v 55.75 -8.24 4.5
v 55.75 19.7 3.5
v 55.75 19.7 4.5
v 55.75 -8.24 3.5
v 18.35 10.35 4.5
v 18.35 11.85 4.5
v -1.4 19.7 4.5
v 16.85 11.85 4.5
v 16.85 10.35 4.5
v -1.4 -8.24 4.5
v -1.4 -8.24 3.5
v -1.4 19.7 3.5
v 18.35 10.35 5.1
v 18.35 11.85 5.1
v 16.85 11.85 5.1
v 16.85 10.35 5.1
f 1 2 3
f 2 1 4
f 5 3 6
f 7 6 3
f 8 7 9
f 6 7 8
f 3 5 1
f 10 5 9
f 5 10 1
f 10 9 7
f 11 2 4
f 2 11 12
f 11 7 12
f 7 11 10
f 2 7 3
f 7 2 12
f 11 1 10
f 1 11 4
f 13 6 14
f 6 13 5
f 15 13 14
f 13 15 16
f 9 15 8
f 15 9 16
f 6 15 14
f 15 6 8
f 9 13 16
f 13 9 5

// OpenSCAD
// file: ../../usb-c-port/usb-c-port.scad
//-----------------------------------------------------------------------
// USB-C port through a wall, flush: the socket's metal shell sits in a
// close-fitting pocket in the wall, walled in on all four sides, its face
// level with the outside. The cable seats the way it does on a laptop.
//
// A board's socket only overhangs the board edge by a mm or so, less than
// the wall. So the board's end tucks into a shallow relief in the wall's
// inner face, the width of the board, leaving the wall round the socket
// thin enough for the face to reach the outside. When that would leave less
// than usbcMinWall (a socket that barely overhangs), the face sits back from
// the outside instead: usbcRecess() says how far.
//
// Modules, all in the same frame:
//   usbcGhost()     the socket and the board's end, for previews
//   usbcWallCut()   subtract from the wall: socket pocket and board relief
//
// Frame: origin on the floor top at the wall's inner face, under the socket's
// axis. +X into the box, Z up. The wall is X = -wall .. 0. The board is
// component side up, socket on top (top-mount, as on the FireBeetle, C3 Super
// Mini and S3 DevKitC). Units: mm.
//
// usbcBoardEdgeX() gives where the board's edge lands (negative: inside the
// wall), so a holder can put its posts or pocket to match.
//-----------------------------------------------------------------------

//-- The socket: USB-C receptacle shell (USB-IF 8.34 x 2.56 plug, receptacle shell ~8.94 x 3.26)
usbcShellW     = 8.94;
usbcShellH     = 3.26;    // CAL per board: measured 3.2 on the FireBeetle
usbcShellR     = 1.2;     // CAL: end radius. Full round would be 1.63; most shells are squarer
usbcShellDepth = 7.35;    // face to back

//-- The pocket
usbcClearance  = 0.15;    // CAL: per side, shell to pocket. Set by the fit piece
usbcMinWall    = 1.0;     // thinnest wall left round the socket
usbcReliefGap  = 0.3;     // board relief over the board, each side and above/below
usbcChamfer    = 0.3;     // lead-in on the outside edge

//-- How far the socket face sits back from the outside: 0 (flush) unless the socket
//-- overhangs the board edge by less than usbcMinWall
function usbcRecess(overhang, minWall = usbcMinWall) = max(0, minWall - overhang);
//-- X of the board's socket edge in this frame
function usbcBoardEdgeX(wall, overhang, recess) =
  -wall + (is_undef(recess) ? usbcRecess(overhang) : recess) + overhang;
//-- Z of the board's underside above the floor top
function usbcBoardZ(axisZ, pcb, shellH = usbcShellH) = axisZ - shellH/2 - pcb;

module usbcShell2D(grow = 0, w = usbcShellW, h = usbcShellH, r = usbcShellR)
{
  offset(r = r + grow, $fn = 24) square([w - 2*r, h - 2*r], center = true);
}

//-- axisZ: socket axis above the floor. boardW/pcb: the board, for the ghost and relief.
//-- shift: socket centre across the board's width from the board's centre line (+Y)
module usbcGhost(axisZ, wall, overhang, boardW, pcb = 1.6, recess, shift = 0, shellH = usbcShellH, shellW = usbcShellW)
{
  ex = usbcBoardEdgeX(wall, overhang, recess);
  %color("Silver") translate([ex - overhang, 0, axisZ]) rotate([0, 90, 0]) rotate([0, 0, 90])
    linear_extrude(usbcShellDepth) usbcShell2D(w = shellW, h = shellH);
  %color("DarkSlateGray") translate([ex, -boardW/2 - shift, usbcBoardZ(axisZ, pcb, shellH)]) cube([12, boardW, pcb]);
}

module usbcWallCut(axisZ, wall, overhang, boardW, pcb = 1.6, recess, shift = 0,
                   clearance = usbcClearance, shellH = usbcShellH, shellW = usbcShellW, aboveBoard)
{
  rc = is_undef(recess) ? usbcRecess(overhang) : recess;
  ex = usbcBoardEdgeX(wall, overhang, rc);
  bz = usbcBoardZ(axisZ, pcb, shellH);
  //-- what stands on the board near its edge: the socket, unless told taller
  up = is_undef(aboveBoard) ? shellH : aboveBoard;
  assert(ex - overhang + wall >= -0.01, "socket face would stand proud of the wall");
  assert(rc > 0 || overhang >= usbcMinWall - 0.01, "wall round the socket under usbcMinWall");
  //-- socket pocket, through the wall
  translate([-wall - 1, 0, axisZ]) rotate([0, 90, 0]) rotate([0, 0, 90])
    linear_extrude(wall + 2) usbcShell2D(clearance, w = shellW, h = shellH);
  //-- lead-in chamfer on the outside
  translate([-wall, 0, axisZ]) rotate([0, 90, 0]) rotate([0, 0, 90])
    hull()
    {
      translate([0, 0, -0.01]) linear_extrude(0.01) usbcShell2D(clearance + usbcChamfer, w = shellW, h = shellH);
      translate([0, 0, usbcChamfer]) linear_extrude(0.01) usbcShell2D(clearance, w = shellW, h = shellH);
    }
  //-- board relief in the inner face, when the board's edge lands inside the wall
  if (ex < 0)
    translate([ex - usbcReliefGap, -boardW/2 - shift - usbcReliefGap, bz - usbcReliefGap])
      cube([-ex + usbcReliefGap + 1, boardW + 2*usbcReliefGap, pcb + up + 2*usbcReliefGap]);
}
// file: ../../board-pocket/board-pocket.scad
//-----------------------------------------------------------------------
// Board pocket: holds a board that has no mounting holes
//
// The board sits on a central pedestal with a pad of double-sided foam tape
// on top, inside a low wall that follows its outline. The pedestal keeps
// the board's edges off the floor, so lead stubs soldered through the edge
// holes have room underneath; gaps in the wall let the leads out. The wall
// only locates the board: the tape holds it down, and in a closed box a lid
// pad presses a pad of foam onto it (boardLidPad below).
//
// Modules, all in the same frame:
//   boardPocketGhost()   the board and its tape, for previews
//   boardPocketHolder()  the plastic: pedestal and outline wall, add to the floor
//   boardLidPad()        a block hanging from the lid that presses foam onto the board
//   boardLidPadGhost()   the foam under it, squashed, for previews
//
// Frame: origin on the floor top, under the centre of the board's outline.
// X along the board's length l, Y across its width w, Z up. Units: mm.
//
// Sides are listed [-X, +X, -Y, +Y], each one of
//   "gap"    wall with a gap in the middle for leads (gapW wide)
//   "solid"  whole wall: use it where the board takes a push (a plug)
//   "open"   no wall: the board's edge goes into a box wall (a USB port)
//
// Used by esp32-c3-supermini, esp32-s3-devkitc and rs485-max485.
//-----------------------------------------------------------------------

//-- From the controller project's receiver.scad / rack-end.scad (boardPocket), 2026-10-30
bpPedestal  = 2.5;     // floor to the tape: room for lead stubs under the board edges
bpTape      = 1.0;     // double-sided foam tape on the pedestal. CAL: how far it squashes
bpWall      = 1.2;     // outline wall thickness
bpRise      = 1.0;     // wall top above the PCB underside (the controller project's rack-end: 0.8 under the S3's module)
bpClearance = 0.4;     // per side, board outline to wall: PETG. 0.3 for PLA. Set by the fit piece
bpGapW      = 6;       // lead gap in a "gap" side
bpPadInset  = 4;       // default pedestal: the board less this all round

//-- Lid hold-down (the controller project's receiver / rack-end lid pads)
bpFoam      = 3.0;     // CAL: self-adhesive foam stuck under each lid pad
bpSqueeze   = 1.0;     // how far the lid squashes it: ~1/3 for soft foam, 0.3 for felt

//-- PCB underside above the floor top
function boardPocketZ(pedestal = bpPedestal, tape = bpTape) = pedestal + tape;
//-- default pedestal [l, w] for a board
function boardPocketPad(l, w, inset = bpPadInset) = [max(l - 2*inset, 4), max(w - 2*inset, 4)];
//-- Z of a lid pad's underside, pressing on a surface at surfaceZ (board top, or a part on it)
function boardLidPadZ(surfaceZ, foam = bpFoam, squeeze = bpSqueeze) =
  assert(squeeze > 0 && squeeze < foam, "foam would not touch the board")
  surfaceZ + foam - squeeze;

function bpSides4(s) = is_list(s) ? s : [s, s, s, s];

module boardPocketGhost(l, w, pcb = 1.6, pad, pedestal = bpPedestal, tape = bpTape)
{
  p = is_undef(pad) ? boardPocketPad(l, w) : pad;
  %color("White") translate([-p[0]/2, -p[1]/2, pedestal]) cube([p[0], p[1], tape]);
  %color("DarkGreen") translate([-l/2, -w/2, pedestal + tape]) cube([l, w, pcb]);
}

//-- pad: pedestal [l, w]; gapW a number or one per side
module boardPocketHolder(l, w, pad, sides = "gap", gapW = bpGapW, clearance = bpClearance,
                         pedestal = bpPedestal, tape = bpTape, wall = bpWall, rise = bpRise)
{
  p   = is_undef(pad) ? boardPocketPad(l, w) : pad;
  s   = bpSides4(sides);
  g   = bpSides4(gapW);
  ix  = l/2 + clearance;                 // inner half sizes
  iy  = w/2 + clearance;
  top = pedestal + tape + rise;
  assert(p[0] <= l && p[1] <= w, "pedestal bigger than the board");
  for (k = s) assert(k == "gap" || k == "solid" || k == "open", str("unknown side ", k));

  //-- pedestal, centred under the board
  translate([-p[0]/2, -p[1]/2, -0.01]) cube([p[0], p[1], pedestal + 0.01]);
  //-- outline wall
  difference()
  {
    translate([-ix - wall, -iy - wall, -0.01]) cube([2*(ix + wall), 2*(iy + wall), top + 0.01]);
    translate([-ix, -iy, -1]) cube([2*ix, 2*iy, top + 2]);
    for (i = [0 : 3])
    {
      //-- each side's cut, drawn for -X then turned into place
      ax = (i < 2) ? ix : iy;         // inner half size across the side
      al = (i < 2) ? iy : ix;         // half length along it
      rotate([0, 0, [0, 180, 90, 270][i]])   // -X, +X, -Y, +Y
      {
        if (s[i] == "gap")
          translate([-ax - wall - 1, -g[i]/2, -1]) cube([wall + 2, g[i], top + 2]);
        if (s[i] == "open")
          translate([-ax - wall - 1, -al - wall - 1, -1]) cube([wall + 1.01, 2*(al + wall + 1), top + 2]);
      }
    }
  }
}

//-- A lid pad over the rectangle size [x, y] centred at `at`, from the squashed foam up to
//-- lidZ (the lid's inner face in this frame), running `into` up into the lid plate
module boardLidPad(size, at = [0, 0], surfaceZ, lidZ, foam = bpFoam, squeeze = bpSqueeze, into = 0.5)
{
  z0 = boardLidPadZ(surfaceZ, foam, squeeze);
  assert(lidZ > z0, "lid is below the pad: the box is too low for the foam");
  translate([at[0] - size[0]/2, at[1] - size[1]/2, z0]) cube([size[0], size[1], lidZ - z0 + into]);
}

module boardLidPadGhost(size, at = [0, 0], surfaceZ, foam = bpFoam, squeeze = bpSqueeze)
{
  %color("Gray") translate([at[0] - size[0]/2, at[1] - size[1]/2, surfaceZ]) cube([size[0], size[1], foam - squeeze]);
}
// main file
// The board as solids, for the catalogue (the Ghost is % so it never renders).
// part = "board" (PCB, LED) | "metal" (module shield, both ports); n boards at the fit
// piece's pitch, recesses and tapes
include <../esp32-s3-devkitc.scad>

wall     = 2.4;
part     = "board";
n        = 1;
pitch    = 36;
stations = [ [0.62, 1.0], [0.8, 1.0], [1.0, 1.0], [0.62, 0.7] ];   // as fit.scad

module s3Solid(recess, tape)
{
  v   = s3Devkit();
  ex  = s3DevkitEdgeX(wall, recess = recess);
  ly  = s3DevkitLeftY();
  top = boardPocketZ(tape = tape) + v[3];
  if (part == "board")
  {
    translate([ex, ly - v[2], top - v[3]]) cube([v[1], v[2], v[3]]);
    translate([ex + v[9][0] - 0.75, ly - v[9][1] - 0.75, top - 0.01]) cube([1.5, 1.5, 0.61]);
  }
  if (part == "metal")
  {
    translate([ex + v[1] + v[8] - s3ModuleL, ly - v[2]/2 - s3ModuleW/2, top]) cube([s3ModuleL, s3ModuleW, s3ModuleH]);
    for (c = v[5])
      translate([ex - v[6], ly - c, top + v[7][1]/2]) rotate([0, 90, 0]) rotate([0, 0, 90])
        linear_extrude(s3ShellDepth) s3Shell2D(v);
  }
}

if (n == 1) s3Solid(undef, bpTape);
else for (i = [0 : n - 1]) translate([0, i*pitch, 0]) s3Solid(stations[i][0], stations[i][1]);
